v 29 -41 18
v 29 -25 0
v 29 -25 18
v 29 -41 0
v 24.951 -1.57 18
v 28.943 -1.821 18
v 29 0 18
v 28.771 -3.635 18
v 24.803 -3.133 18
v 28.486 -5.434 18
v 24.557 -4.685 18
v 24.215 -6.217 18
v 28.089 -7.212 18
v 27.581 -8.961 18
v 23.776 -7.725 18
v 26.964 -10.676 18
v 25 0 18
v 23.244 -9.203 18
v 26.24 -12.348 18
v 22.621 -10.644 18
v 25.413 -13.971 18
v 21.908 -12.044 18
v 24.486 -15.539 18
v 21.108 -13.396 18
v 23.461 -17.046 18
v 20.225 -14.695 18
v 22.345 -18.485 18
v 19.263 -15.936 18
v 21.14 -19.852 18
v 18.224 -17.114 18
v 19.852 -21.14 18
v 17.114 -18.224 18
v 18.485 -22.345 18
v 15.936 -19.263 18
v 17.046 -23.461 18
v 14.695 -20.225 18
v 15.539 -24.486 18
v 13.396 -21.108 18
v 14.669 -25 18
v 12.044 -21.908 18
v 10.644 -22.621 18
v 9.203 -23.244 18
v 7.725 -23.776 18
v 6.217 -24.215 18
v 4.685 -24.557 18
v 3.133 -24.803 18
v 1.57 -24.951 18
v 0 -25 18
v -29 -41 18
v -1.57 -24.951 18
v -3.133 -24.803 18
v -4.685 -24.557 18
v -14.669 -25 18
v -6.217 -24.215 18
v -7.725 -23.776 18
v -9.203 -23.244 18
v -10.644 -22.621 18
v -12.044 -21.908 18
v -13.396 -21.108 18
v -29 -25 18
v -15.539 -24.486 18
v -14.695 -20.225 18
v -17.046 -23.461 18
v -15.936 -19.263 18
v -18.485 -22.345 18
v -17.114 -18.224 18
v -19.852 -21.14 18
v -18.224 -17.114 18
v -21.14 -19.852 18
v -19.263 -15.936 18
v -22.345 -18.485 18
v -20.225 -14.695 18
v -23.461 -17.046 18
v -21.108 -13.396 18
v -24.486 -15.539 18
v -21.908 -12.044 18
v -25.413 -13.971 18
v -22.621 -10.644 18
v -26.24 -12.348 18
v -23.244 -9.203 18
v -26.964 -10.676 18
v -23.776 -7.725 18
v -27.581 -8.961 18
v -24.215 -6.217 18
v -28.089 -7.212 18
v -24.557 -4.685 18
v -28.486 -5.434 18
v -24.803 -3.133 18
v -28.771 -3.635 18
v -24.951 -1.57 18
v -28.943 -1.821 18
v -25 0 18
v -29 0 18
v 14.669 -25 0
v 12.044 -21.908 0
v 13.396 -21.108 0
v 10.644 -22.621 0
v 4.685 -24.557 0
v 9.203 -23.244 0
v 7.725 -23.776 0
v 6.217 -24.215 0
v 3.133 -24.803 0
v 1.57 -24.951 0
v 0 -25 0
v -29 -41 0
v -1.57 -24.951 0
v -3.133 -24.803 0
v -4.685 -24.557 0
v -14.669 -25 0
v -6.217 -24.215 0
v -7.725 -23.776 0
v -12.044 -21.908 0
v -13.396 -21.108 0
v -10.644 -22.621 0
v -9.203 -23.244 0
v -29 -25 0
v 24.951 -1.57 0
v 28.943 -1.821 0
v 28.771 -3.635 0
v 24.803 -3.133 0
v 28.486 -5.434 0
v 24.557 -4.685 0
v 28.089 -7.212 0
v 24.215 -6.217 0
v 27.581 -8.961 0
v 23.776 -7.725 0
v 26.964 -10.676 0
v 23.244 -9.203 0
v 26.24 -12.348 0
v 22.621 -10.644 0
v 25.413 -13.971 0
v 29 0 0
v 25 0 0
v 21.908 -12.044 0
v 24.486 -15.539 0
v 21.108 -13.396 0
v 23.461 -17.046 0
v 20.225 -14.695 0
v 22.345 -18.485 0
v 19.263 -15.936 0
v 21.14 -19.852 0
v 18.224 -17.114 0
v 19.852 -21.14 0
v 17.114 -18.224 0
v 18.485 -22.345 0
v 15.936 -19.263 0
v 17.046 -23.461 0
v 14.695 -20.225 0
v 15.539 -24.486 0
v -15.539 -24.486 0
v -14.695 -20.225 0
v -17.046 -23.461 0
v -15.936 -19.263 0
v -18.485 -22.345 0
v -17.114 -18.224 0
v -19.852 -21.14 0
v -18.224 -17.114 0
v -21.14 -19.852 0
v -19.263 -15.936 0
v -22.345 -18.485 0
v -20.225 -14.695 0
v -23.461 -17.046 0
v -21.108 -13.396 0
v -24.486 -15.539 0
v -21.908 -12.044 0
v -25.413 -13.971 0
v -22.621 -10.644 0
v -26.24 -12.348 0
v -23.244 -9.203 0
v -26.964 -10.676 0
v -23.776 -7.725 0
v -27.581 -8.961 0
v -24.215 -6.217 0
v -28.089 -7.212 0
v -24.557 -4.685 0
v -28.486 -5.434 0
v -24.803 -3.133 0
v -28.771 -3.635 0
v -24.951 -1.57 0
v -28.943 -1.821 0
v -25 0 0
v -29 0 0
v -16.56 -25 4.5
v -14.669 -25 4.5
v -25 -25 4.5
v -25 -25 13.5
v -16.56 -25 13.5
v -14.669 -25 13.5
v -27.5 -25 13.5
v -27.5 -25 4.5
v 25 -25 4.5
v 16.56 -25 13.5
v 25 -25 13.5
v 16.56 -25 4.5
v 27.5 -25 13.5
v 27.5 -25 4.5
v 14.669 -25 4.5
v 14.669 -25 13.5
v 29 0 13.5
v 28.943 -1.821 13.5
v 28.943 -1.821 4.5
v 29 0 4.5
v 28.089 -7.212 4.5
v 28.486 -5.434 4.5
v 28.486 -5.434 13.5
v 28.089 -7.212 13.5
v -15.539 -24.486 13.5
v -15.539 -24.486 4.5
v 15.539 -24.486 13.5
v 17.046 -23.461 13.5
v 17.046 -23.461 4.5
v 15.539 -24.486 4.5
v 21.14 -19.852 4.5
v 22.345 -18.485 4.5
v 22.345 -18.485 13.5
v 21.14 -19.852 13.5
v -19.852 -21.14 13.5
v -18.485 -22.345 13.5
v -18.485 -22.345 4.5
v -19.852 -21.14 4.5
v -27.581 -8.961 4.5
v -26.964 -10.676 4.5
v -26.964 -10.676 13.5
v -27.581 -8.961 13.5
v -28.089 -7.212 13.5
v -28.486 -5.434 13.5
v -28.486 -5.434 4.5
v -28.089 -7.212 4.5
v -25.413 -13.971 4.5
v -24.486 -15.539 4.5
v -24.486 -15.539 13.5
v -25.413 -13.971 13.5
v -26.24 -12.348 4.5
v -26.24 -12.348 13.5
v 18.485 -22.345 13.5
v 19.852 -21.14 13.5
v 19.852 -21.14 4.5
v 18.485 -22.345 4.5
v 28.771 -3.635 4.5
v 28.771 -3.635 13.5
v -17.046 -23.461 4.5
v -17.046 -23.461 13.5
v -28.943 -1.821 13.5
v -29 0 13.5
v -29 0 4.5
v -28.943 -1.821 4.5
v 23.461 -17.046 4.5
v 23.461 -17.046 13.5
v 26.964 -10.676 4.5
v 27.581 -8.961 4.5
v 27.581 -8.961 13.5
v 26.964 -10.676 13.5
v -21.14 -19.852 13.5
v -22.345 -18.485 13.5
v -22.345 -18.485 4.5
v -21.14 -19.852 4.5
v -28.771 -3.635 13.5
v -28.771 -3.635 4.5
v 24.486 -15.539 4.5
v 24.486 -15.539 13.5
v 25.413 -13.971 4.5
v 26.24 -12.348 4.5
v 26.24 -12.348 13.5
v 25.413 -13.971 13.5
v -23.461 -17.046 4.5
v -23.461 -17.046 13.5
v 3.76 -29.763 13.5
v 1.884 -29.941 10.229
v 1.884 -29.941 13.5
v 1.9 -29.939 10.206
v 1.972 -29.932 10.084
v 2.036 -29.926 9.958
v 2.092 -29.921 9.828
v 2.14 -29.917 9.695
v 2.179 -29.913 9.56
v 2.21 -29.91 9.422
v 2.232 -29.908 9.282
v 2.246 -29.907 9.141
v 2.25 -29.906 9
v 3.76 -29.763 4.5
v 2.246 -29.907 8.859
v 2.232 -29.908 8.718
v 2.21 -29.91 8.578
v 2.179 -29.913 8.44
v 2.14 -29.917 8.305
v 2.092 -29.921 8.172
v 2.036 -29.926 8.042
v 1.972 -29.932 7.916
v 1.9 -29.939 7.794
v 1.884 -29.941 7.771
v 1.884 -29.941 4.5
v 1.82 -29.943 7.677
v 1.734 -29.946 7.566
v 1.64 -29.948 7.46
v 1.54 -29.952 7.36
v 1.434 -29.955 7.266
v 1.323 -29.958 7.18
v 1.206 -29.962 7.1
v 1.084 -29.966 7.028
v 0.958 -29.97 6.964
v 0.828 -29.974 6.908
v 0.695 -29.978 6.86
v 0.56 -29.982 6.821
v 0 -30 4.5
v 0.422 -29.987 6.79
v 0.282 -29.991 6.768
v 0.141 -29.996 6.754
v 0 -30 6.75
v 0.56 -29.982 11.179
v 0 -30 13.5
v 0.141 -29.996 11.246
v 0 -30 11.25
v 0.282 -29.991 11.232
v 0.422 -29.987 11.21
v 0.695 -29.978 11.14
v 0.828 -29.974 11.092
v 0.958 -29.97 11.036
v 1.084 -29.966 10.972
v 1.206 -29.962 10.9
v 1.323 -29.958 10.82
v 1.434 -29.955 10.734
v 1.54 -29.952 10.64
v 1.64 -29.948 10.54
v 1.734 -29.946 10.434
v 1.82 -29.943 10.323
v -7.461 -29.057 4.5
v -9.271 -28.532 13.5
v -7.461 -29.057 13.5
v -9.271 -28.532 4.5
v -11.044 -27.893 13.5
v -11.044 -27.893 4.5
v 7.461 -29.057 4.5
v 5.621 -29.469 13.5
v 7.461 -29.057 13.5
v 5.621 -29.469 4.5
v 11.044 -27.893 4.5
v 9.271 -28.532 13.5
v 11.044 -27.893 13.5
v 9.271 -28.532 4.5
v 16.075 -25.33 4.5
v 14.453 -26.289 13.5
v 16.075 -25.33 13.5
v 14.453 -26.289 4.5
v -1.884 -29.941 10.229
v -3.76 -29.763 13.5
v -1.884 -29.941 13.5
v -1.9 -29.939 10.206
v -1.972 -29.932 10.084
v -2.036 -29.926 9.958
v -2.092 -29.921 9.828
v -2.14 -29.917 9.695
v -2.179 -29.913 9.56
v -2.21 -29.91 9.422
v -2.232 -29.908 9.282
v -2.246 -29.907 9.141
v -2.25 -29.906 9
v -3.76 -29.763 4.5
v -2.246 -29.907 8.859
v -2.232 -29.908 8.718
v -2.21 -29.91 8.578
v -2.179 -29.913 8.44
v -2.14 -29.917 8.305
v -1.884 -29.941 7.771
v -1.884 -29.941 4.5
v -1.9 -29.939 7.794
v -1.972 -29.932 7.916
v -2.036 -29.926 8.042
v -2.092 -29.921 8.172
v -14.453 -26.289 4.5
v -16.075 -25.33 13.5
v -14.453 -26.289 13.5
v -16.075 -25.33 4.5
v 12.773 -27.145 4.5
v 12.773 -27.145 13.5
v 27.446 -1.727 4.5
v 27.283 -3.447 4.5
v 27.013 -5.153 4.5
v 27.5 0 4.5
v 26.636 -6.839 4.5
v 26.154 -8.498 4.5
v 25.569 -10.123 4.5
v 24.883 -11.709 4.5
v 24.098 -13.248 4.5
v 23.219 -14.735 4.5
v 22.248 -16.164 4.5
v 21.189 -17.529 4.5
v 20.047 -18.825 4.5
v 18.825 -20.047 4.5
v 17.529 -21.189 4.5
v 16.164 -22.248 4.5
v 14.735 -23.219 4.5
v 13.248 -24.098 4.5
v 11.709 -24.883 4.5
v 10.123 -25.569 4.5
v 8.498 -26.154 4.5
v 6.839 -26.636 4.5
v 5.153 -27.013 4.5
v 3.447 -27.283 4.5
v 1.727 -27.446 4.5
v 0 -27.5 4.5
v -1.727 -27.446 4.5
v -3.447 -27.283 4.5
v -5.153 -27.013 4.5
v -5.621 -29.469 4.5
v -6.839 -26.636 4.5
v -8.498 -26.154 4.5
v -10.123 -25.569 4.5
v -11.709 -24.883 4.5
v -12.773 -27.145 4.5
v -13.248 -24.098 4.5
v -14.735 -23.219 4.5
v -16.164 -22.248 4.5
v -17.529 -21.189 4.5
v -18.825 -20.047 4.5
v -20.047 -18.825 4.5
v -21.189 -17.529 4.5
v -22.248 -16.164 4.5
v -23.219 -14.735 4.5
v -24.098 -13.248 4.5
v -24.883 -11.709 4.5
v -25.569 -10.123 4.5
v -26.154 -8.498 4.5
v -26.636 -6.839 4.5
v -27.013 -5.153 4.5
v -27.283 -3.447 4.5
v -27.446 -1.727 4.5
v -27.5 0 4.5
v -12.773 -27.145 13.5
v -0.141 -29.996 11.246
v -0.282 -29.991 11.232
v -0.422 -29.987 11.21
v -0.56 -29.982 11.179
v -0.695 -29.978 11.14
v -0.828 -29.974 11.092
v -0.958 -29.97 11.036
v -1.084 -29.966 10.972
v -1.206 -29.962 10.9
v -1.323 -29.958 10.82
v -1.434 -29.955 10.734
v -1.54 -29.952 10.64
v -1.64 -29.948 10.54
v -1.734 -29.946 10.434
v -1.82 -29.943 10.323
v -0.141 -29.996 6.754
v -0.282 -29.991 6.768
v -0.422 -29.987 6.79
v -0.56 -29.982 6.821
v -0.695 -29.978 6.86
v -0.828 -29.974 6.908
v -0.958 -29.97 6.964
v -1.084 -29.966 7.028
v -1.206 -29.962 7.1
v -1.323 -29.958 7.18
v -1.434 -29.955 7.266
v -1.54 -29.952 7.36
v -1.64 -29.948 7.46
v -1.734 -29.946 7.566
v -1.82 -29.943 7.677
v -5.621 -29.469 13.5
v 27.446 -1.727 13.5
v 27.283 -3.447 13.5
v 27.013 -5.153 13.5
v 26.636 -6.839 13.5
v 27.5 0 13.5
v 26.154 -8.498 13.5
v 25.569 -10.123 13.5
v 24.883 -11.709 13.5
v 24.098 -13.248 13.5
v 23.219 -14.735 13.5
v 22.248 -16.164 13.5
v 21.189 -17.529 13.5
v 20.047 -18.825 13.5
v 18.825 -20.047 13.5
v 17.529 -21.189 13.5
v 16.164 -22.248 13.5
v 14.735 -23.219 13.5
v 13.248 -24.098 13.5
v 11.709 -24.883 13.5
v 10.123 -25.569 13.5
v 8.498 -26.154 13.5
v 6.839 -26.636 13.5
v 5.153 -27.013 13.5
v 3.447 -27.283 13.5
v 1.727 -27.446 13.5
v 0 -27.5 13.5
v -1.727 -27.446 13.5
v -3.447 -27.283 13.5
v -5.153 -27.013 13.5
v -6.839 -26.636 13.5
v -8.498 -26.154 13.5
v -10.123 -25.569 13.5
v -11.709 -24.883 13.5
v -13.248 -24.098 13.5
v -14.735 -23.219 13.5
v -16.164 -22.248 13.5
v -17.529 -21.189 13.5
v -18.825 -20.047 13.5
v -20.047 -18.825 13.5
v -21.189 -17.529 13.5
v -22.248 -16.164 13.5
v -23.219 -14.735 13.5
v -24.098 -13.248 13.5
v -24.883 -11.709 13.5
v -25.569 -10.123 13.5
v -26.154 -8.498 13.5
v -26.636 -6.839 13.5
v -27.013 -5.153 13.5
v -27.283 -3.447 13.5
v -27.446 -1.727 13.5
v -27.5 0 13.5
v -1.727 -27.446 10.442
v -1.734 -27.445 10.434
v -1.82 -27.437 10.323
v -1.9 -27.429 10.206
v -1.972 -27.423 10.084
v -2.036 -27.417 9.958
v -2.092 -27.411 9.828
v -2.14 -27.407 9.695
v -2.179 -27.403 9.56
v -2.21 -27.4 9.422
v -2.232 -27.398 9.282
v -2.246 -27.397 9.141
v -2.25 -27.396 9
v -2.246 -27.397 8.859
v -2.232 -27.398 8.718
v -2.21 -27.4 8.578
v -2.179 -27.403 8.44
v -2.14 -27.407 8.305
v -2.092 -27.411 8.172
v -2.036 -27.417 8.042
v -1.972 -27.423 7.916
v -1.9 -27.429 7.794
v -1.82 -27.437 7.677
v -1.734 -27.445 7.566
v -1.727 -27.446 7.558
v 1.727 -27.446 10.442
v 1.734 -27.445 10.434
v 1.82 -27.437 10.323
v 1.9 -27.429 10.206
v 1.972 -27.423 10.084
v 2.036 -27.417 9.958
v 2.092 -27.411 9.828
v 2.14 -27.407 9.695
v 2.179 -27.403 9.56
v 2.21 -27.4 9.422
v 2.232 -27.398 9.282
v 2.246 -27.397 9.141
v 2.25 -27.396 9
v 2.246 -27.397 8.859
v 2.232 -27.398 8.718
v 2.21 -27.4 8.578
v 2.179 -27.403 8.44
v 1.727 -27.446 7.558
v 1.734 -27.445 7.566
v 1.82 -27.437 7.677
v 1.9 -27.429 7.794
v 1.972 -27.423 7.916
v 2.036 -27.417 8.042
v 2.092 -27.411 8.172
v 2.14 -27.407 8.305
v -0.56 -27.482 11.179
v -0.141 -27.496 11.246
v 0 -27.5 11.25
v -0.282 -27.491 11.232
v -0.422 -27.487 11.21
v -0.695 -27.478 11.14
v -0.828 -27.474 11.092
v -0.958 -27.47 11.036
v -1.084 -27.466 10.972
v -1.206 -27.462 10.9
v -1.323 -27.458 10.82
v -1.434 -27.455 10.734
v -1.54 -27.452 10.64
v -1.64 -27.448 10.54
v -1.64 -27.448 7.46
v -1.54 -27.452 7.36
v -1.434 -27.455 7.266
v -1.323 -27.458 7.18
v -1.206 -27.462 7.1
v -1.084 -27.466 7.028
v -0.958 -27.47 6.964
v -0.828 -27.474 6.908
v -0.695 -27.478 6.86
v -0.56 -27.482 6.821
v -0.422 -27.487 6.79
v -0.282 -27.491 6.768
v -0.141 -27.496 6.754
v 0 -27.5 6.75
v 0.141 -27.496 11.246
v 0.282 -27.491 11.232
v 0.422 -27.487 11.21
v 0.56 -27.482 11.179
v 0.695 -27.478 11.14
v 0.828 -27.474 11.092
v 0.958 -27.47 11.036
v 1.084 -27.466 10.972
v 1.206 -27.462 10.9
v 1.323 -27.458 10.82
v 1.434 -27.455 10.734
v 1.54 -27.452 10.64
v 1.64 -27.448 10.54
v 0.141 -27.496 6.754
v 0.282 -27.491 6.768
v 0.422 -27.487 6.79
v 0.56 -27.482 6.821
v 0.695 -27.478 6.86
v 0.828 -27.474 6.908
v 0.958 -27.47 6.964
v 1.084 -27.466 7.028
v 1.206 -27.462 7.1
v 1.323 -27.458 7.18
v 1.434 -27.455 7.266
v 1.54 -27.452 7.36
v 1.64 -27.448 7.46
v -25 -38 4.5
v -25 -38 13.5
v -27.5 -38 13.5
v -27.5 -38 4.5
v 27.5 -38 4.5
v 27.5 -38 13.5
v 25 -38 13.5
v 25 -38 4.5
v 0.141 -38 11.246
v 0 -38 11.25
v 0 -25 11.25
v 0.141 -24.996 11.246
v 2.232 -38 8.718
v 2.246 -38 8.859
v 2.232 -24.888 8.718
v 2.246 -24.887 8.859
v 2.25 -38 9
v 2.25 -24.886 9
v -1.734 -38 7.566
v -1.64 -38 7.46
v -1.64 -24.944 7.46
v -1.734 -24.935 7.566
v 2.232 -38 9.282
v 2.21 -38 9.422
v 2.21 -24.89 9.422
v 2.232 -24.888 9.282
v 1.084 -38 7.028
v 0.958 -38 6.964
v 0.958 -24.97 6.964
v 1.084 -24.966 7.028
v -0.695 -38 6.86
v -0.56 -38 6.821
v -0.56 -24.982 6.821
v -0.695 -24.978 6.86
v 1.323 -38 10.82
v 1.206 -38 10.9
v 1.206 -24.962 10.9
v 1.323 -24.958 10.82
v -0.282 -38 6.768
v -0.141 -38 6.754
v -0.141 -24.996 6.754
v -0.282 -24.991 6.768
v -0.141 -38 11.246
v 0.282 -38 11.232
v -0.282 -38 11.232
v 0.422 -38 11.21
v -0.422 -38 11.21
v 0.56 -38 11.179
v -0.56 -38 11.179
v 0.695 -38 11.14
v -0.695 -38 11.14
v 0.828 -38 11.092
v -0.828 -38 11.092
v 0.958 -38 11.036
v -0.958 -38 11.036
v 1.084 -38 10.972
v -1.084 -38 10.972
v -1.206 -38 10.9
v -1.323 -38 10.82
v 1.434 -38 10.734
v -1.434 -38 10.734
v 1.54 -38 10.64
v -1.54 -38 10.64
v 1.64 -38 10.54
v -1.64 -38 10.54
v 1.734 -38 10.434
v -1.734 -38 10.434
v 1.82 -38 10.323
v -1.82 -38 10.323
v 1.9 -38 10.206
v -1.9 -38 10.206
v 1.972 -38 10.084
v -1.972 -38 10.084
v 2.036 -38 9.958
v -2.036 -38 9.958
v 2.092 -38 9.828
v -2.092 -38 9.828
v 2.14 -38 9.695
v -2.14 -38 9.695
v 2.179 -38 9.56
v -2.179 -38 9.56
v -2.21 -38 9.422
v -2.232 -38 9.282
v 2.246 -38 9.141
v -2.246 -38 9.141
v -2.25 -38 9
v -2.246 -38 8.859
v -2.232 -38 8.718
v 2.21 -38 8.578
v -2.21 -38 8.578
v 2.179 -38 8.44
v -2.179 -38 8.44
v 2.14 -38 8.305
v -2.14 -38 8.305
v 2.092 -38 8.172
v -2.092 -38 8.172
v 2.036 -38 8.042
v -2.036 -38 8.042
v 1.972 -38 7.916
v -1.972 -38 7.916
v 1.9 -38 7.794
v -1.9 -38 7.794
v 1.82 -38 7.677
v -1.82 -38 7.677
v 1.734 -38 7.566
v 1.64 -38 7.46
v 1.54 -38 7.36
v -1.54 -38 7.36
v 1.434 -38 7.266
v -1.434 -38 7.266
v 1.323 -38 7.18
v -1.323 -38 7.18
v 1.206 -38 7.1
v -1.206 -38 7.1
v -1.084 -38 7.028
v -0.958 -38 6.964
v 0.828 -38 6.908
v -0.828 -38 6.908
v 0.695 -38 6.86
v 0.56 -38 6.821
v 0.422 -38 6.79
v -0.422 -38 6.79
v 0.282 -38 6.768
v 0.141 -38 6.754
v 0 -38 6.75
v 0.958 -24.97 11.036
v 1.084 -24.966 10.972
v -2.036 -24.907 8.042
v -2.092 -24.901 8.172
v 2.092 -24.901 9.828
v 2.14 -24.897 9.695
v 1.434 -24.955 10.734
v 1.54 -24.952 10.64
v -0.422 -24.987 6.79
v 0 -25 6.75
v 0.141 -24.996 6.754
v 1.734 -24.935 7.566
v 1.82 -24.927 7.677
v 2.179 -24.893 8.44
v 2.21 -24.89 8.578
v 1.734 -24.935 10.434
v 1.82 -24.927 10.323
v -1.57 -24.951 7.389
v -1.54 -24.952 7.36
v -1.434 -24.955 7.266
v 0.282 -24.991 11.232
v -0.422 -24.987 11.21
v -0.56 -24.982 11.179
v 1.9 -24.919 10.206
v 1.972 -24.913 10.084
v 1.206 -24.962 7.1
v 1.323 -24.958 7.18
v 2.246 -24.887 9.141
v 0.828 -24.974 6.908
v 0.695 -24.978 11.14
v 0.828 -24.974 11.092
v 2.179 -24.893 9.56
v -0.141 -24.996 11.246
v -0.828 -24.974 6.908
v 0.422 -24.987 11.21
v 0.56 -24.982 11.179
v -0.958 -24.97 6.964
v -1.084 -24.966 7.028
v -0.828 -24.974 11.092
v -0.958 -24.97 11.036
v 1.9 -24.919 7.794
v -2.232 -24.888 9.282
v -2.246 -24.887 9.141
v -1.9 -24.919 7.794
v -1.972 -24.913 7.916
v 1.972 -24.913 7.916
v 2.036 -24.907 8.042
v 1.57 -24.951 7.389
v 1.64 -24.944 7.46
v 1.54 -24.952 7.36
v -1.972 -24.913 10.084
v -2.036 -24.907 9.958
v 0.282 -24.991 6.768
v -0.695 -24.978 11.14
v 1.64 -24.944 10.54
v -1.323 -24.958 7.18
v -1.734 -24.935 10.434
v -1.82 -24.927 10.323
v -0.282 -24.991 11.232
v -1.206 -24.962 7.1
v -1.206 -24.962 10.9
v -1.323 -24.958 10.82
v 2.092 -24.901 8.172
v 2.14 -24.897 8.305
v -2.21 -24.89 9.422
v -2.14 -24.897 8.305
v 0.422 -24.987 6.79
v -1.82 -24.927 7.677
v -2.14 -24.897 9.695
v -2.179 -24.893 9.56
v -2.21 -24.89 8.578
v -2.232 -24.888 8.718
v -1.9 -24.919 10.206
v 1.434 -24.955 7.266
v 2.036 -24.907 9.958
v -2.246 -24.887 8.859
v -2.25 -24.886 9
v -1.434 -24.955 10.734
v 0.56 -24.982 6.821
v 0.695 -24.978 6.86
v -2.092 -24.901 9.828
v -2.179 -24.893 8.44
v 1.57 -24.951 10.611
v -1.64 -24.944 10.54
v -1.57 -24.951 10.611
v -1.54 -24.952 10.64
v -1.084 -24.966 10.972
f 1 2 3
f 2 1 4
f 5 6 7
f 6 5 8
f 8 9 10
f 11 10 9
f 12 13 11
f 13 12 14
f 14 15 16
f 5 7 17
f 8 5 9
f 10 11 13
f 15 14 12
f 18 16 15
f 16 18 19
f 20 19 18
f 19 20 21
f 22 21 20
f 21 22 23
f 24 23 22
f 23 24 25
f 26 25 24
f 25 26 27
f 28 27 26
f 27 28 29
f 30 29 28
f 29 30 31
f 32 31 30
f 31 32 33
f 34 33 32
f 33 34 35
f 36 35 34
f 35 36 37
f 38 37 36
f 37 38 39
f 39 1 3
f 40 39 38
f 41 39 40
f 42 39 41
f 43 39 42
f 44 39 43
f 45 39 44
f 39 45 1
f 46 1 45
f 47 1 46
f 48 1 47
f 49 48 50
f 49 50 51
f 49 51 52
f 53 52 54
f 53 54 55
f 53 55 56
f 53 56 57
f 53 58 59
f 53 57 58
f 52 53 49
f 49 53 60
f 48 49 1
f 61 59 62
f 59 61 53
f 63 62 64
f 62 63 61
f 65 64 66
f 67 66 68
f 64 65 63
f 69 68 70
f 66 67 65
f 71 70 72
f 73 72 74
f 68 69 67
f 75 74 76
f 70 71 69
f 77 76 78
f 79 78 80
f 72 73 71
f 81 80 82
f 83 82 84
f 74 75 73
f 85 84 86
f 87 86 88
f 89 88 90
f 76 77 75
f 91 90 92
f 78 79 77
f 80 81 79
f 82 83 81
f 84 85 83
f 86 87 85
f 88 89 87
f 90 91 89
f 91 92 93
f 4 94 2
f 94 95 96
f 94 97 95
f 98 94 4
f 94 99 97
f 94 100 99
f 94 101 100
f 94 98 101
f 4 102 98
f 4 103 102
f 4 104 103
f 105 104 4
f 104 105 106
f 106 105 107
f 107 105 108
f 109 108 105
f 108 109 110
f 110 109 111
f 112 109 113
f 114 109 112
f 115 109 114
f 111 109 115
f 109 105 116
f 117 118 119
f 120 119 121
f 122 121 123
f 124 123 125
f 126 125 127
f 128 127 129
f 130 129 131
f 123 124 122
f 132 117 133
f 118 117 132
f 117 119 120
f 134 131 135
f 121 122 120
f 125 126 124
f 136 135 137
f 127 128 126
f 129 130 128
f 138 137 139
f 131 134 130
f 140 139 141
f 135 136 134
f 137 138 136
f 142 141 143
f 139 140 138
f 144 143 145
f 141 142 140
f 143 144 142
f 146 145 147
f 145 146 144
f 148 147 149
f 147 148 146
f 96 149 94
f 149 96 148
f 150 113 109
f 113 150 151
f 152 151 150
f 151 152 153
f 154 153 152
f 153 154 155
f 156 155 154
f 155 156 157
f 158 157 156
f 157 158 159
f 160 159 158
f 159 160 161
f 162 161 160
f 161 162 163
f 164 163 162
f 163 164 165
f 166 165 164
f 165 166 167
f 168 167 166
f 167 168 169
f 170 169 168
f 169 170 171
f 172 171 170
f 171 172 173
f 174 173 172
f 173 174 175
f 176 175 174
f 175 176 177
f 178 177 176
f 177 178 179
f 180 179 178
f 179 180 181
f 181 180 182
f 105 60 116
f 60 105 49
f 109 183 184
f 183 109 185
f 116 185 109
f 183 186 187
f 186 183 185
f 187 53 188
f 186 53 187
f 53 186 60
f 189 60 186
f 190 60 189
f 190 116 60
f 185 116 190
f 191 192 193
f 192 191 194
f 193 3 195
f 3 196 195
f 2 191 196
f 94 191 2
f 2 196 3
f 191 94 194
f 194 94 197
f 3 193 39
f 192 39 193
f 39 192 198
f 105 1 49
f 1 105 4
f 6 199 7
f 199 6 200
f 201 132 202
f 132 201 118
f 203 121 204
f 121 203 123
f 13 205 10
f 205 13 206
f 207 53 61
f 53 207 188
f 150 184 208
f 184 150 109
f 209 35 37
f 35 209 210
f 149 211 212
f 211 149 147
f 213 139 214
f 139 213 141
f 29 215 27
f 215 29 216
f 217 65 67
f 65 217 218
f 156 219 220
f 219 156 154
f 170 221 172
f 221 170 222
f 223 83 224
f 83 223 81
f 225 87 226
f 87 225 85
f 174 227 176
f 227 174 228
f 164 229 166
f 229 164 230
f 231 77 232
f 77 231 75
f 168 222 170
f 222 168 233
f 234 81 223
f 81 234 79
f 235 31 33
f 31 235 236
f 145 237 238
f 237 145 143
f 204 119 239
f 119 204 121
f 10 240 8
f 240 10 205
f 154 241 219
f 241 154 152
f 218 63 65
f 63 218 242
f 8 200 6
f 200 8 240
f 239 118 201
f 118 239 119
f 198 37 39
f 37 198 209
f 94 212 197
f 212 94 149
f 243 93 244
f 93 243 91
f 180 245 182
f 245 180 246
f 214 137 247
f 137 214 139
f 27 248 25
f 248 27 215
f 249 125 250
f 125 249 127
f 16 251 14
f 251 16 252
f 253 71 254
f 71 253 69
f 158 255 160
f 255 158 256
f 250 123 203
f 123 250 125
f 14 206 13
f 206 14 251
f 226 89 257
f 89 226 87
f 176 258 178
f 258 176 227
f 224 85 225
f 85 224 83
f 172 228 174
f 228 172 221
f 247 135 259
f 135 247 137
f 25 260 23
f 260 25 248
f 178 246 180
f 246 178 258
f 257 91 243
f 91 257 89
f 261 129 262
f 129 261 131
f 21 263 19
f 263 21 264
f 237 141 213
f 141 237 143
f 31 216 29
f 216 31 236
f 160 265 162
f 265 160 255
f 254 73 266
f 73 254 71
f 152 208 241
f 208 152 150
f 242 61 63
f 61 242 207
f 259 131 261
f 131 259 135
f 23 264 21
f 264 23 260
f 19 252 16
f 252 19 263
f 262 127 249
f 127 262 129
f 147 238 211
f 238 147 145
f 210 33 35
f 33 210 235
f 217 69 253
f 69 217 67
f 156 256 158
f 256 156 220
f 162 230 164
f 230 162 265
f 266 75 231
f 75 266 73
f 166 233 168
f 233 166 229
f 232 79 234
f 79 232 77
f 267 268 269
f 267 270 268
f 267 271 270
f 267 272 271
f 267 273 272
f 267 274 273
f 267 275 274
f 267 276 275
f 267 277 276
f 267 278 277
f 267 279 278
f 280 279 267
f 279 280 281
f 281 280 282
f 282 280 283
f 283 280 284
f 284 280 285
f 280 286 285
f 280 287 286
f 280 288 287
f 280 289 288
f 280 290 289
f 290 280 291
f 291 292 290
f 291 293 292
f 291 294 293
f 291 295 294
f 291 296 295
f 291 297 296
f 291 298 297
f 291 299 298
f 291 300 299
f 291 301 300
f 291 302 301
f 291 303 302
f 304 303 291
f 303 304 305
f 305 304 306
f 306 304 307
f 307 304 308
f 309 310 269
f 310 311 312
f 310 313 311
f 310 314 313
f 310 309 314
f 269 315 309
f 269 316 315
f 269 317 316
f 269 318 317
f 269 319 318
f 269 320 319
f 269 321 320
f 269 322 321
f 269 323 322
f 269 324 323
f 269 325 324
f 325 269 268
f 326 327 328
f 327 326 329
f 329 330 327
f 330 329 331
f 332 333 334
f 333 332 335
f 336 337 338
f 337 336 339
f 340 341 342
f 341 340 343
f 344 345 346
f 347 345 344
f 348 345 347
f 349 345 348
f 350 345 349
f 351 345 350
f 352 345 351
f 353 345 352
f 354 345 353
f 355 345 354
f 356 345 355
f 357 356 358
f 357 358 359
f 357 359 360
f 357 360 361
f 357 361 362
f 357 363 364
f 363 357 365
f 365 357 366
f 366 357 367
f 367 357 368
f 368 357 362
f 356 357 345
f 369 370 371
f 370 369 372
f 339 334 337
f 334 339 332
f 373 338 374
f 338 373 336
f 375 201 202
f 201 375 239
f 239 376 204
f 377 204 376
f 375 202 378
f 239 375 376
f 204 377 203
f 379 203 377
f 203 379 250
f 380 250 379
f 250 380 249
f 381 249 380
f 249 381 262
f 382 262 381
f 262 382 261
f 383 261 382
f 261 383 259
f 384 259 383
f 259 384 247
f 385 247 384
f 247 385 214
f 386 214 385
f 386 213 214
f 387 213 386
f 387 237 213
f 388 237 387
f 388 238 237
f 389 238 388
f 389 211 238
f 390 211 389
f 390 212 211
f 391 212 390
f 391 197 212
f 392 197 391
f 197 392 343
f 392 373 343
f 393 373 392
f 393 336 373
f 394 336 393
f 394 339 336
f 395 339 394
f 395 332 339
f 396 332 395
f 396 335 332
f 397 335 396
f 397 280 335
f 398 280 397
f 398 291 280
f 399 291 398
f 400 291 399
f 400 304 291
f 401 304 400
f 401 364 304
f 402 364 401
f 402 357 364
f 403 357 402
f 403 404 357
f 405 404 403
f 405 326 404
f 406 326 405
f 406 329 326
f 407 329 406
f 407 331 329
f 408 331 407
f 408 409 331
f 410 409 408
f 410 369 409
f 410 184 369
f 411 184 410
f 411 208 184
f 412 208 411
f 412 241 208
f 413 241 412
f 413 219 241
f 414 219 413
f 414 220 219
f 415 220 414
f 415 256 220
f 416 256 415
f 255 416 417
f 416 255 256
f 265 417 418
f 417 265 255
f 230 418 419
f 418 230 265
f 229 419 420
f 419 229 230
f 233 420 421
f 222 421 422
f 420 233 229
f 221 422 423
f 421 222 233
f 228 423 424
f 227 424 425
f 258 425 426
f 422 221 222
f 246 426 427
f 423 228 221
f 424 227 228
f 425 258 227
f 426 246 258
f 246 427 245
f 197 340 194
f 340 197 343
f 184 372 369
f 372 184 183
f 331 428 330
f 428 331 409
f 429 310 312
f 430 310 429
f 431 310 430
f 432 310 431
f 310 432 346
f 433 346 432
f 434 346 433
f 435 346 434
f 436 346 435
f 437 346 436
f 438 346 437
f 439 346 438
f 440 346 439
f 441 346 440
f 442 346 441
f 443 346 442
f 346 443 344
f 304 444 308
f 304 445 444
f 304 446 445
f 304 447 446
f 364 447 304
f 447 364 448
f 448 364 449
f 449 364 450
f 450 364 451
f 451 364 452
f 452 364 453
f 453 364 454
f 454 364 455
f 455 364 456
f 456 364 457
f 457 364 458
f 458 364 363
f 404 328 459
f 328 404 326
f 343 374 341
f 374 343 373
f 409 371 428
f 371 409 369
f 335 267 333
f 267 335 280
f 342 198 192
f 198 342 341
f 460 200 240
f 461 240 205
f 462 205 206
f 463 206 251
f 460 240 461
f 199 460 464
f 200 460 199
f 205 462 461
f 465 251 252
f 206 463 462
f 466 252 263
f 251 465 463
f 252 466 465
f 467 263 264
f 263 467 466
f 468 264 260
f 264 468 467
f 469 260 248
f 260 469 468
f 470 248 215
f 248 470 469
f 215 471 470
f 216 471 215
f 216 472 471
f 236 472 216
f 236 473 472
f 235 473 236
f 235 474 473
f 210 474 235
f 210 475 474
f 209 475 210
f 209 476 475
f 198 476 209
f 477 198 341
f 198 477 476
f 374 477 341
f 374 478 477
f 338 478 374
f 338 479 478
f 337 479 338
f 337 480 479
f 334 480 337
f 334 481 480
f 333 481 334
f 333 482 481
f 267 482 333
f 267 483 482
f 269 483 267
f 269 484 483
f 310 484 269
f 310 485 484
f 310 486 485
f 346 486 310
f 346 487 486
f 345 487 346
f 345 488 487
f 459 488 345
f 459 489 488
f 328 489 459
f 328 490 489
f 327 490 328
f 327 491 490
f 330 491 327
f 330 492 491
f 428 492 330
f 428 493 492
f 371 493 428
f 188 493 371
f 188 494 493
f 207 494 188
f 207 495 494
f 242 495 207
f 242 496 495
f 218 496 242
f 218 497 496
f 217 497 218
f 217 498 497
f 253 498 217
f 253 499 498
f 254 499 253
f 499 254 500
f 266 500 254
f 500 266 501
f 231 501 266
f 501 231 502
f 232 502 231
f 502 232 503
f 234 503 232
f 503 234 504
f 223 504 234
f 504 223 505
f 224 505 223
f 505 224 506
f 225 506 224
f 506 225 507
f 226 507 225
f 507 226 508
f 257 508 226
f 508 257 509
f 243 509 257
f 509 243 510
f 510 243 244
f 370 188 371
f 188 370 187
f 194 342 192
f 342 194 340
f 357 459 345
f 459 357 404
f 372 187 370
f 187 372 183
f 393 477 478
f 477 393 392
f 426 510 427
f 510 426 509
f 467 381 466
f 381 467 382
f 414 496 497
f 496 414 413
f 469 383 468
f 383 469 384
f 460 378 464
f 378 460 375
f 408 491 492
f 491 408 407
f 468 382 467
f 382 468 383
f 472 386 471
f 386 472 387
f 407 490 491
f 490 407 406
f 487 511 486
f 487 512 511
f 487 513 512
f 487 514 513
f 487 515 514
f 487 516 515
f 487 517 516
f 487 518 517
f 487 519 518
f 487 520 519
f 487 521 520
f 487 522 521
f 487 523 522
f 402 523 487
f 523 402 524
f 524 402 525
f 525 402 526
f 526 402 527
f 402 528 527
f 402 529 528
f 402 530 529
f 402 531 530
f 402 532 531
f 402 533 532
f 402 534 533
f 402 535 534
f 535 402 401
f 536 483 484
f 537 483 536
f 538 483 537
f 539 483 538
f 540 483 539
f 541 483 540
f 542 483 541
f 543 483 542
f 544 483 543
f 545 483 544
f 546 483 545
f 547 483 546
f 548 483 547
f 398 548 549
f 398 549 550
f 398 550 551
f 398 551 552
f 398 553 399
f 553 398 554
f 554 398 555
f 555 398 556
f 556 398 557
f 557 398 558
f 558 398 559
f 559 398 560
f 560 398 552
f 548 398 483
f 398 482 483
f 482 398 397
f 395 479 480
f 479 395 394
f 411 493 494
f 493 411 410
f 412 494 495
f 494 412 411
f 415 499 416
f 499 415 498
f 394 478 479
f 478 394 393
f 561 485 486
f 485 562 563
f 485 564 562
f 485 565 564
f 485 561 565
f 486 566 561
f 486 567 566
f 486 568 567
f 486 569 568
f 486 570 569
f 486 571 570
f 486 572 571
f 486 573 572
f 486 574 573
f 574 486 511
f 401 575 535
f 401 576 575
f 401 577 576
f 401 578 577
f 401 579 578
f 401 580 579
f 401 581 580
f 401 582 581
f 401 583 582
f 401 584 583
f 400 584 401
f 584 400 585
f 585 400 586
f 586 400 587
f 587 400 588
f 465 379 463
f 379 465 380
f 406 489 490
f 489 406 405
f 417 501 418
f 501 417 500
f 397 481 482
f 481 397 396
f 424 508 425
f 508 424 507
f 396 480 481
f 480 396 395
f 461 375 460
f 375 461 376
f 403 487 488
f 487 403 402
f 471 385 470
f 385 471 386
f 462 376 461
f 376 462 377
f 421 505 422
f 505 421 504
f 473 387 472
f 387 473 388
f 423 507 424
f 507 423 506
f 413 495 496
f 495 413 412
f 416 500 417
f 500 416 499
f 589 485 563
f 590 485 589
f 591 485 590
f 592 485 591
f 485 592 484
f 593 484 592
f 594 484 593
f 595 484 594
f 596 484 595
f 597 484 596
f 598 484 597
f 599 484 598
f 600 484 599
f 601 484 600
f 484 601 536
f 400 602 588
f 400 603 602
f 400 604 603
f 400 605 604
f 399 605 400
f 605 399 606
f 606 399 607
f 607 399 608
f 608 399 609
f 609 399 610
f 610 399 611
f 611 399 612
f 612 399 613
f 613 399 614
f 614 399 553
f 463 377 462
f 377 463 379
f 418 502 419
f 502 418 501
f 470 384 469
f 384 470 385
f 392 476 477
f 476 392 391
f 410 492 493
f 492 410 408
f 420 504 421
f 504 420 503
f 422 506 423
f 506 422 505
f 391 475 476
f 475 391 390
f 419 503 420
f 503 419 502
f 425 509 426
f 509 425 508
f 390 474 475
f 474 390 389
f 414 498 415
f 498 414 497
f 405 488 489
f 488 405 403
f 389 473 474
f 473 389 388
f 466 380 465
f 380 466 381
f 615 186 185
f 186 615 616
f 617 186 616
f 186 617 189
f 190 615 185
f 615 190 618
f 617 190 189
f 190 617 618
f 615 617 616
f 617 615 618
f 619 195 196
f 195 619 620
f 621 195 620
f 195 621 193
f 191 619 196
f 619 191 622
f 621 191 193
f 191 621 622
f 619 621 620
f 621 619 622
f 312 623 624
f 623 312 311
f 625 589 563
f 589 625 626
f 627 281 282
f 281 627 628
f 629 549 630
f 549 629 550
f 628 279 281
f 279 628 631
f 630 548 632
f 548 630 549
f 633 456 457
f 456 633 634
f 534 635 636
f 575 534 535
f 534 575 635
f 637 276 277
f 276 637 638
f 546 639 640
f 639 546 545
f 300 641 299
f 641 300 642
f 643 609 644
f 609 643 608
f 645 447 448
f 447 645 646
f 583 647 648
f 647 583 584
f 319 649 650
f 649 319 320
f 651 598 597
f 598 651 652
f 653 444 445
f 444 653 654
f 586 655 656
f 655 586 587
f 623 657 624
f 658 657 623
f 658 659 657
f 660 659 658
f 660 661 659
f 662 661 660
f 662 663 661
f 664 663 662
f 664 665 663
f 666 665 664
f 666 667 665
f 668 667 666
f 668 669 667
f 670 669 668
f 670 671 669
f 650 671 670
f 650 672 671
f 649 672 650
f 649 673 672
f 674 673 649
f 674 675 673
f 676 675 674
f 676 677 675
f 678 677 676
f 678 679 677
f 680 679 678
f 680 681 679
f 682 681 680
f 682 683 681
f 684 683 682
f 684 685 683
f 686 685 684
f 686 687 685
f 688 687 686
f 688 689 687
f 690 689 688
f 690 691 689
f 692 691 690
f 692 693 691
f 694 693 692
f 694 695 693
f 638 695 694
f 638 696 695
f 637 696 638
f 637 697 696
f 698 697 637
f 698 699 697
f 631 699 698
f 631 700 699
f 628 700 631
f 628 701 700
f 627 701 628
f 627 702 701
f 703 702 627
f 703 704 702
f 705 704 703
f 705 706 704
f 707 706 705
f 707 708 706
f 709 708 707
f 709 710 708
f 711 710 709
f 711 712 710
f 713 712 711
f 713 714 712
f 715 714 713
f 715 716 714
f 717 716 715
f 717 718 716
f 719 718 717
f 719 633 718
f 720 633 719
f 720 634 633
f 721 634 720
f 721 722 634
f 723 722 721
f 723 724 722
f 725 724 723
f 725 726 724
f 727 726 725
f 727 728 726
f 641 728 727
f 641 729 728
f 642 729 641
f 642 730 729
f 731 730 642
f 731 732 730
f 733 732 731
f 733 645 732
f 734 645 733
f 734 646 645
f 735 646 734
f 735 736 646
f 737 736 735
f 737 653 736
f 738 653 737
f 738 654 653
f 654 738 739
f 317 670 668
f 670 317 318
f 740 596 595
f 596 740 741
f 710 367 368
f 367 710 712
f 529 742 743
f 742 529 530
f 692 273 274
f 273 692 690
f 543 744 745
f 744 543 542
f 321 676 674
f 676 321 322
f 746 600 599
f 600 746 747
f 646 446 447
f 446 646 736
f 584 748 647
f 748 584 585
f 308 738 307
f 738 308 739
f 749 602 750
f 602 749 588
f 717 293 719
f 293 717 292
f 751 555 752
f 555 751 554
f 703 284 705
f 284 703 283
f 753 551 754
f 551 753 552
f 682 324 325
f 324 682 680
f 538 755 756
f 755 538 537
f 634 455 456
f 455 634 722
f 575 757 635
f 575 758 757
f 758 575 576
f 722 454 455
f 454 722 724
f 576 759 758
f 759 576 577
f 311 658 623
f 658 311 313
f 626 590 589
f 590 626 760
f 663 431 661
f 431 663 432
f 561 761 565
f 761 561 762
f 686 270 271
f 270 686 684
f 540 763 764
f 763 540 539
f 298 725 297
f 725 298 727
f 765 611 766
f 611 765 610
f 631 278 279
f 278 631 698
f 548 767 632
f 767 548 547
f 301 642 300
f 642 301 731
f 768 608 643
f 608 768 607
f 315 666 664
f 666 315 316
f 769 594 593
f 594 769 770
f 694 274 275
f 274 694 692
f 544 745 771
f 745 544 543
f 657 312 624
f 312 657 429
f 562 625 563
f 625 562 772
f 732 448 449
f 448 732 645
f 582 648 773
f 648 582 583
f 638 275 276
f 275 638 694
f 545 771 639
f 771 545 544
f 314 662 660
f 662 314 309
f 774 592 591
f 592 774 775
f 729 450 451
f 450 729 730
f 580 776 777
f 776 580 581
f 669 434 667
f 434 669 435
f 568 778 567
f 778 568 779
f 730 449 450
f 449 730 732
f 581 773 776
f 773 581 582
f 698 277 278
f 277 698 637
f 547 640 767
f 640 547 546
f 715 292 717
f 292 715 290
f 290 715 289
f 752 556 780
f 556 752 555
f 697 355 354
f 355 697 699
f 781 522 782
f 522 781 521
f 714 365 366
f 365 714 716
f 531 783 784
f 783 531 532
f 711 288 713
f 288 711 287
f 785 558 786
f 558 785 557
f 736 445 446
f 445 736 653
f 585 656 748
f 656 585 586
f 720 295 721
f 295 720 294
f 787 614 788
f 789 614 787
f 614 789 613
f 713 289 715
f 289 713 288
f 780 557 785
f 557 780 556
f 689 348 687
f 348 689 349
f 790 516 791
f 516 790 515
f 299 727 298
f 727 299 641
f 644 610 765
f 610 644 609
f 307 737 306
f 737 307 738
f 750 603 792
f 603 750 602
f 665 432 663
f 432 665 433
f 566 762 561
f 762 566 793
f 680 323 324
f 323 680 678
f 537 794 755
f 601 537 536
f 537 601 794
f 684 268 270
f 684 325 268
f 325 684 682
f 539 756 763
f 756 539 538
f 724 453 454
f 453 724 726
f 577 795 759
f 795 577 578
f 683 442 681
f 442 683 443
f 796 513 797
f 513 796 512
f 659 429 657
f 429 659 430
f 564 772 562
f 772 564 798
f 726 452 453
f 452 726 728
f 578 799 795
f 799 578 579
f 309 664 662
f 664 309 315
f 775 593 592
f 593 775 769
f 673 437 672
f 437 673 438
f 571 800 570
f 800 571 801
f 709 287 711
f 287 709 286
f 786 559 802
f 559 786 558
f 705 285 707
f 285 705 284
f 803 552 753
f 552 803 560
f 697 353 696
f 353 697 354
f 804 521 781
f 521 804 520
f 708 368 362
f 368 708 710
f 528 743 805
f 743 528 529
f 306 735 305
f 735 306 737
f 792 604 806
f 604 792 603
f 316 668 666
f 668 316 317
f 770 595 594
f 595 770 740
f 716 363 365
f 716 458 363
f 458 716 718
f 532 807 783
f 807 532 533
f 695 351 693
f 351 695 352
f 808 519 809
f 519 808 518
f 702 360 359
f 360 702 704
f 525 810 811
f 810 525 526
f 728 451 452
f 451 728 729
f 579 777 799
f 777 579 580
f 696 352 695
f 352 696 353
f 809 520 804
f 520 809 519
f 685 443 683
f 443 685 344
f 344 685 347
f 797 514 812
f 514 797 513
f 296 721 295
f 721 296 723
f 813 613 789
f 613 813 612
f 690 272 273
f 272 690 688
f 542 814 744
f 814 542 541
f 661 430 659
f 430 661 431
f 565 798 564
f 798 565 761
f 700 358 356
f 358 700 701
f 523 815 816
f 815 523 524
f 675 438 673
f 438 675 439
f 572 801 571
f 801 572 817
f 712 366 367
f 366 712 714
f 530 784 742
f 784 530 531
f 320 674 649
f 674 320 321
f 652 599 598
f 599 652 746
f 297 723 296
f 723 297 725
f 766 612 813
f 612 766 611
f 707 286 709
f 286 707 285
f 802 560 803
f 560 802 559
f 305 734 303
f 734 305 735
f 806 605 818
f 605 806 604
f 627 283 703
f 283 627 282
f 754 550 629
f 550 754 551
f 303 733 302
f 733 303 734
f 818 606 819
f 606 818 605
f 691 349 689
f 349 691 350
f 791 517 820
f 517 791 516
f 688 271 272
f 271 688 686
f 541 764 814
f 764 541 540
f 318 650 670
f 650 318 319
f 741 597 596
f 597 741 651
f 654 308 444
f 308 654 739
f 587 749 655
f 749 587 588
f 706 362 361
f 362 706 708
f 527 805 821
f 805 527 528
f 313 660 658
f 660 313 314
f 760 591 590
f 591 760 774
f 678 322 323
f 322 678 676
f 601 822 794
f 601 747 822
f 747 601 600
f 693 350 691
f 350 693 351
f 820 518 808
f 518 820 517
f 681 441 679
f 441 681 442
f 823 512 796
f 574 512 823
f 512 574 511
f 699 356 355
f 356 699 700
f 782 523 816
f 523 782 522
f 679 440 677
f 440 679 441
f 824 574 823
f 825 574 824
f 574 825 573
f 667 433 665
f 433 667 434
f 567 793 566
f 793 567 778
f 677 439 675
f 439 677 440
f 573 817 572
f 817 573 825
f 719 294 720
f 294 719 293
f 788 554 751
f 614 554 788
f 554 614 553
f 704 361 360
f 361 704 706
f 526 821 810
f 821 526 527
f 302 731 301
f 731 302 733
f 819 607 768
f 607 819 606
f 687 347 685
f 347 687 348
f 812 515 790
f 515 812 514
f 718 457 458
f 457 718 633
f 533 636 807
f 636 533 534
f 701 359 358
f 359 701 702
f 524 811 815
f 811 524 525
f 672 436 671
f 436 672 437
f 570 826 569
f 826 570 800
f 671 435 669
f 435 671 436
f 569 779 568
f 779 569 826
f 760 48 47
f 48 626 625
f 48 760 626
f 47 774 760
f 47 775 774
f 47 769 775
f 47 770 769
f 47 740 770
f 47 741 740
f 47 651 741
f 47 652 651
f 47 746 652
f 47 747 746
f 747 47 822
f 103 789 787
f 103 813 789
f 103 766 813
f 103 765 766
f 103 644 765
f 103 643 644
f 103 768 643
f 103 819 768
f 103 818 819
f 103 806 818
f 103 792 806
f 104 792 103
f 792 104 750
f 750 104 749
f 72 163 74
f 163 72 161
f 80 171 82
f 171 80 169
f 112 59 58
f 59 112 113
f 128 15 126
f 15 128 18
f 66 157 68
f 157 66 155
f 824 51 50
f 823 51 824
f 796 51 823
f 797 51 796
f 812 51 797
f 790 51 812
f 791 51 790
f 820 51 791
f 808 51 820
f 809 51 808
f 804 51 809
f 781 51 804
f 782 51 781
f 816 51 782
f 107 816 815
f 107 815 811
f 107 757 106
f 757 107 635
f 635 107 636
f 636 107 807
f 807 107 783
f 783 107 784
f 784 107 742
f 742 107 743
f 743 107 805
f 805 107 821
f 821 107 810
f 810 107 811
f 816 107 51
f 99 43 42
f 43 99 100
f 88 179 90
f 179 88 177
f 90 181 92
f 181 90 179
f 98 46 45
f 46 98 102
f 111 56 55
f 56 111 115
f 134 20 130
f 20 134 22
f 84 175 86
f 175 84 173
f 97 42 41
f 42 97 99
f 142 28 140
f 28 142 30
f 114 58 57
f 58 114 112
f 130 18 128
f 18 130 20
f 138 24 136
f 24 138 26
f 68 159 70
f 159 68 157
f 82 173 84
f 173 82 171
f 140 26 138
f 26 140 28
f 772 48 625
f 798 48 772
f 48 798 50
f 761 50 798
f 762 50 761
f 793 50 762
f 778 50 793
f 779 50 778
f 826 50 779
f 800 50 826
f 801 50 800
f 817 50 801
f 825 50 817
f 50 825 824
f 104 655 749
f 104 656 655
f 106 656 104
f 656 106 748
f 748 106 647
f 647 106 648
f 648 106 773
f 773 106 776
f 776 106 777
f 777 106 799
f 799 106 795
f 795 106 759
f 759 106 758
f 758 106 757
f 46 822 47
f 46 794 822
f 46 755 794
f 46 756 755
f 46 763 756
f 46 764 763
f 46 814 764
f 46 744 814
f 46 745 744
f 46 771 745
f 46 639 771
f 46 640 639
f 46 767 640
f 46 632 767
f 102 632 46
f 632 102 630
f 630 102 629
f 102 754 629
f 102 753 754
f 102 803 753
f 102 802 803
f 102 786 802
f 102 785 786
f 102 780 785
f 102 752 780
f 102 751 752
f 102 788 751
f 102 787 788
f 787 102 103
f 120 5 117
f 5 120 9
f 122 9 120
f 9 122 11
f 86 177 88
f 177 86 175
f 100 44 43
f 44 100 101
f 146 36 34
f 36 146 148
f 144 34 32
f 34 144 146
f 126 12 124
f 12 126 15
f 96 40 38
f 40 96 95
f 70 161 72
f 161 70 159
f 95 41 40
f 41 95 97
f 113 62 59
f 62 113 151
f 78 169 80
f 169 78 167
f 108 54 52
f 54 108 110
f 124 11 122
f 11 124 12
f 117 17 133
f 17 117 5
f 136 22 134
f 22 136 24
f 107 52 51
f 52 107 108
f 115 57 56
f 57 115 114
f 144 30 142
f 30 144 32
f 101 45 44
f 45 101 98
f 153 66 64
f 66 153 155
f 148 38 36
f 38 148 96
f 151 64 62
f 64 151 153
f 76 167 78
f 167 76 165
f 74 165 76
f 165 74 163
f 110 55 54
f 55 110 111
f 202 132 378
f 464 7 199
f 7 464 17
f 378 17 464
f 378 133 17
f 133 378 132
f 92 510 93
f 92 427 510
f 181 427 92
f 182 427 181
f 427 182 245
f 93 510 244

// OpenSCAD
// --- PARAMÈTRES RÉGLABLES ---
$fn = 100;                  // Résolution des cylindres

// Dimensions du tuyau
d_tuyau = 50;               // Diamètre extérieur du tuyau (mm)
epaisseur_bride = 4;        // Épaisseur du plastique autour du tuyau (mm)
largeur_bride = 18;         // Largeur de la bride (mm) - Augmentée pour la solidité

// Dimensions du passage de l'attache-câble (Colson / Serflex)
largeur_collier = 9;        // Largeur max du collier (mm)
epaisseur_collier = 2.5;    // Épaisseur max du collier (mm)

// Dimensions de l'embase de fixation (vis)
d_vis = 4.5;                // Diamètre du trou de vis (mm)
d_fraisage = 9;             // Diamètre de la tête de vis (mm)
profondeur_fraisage = 3;    // Profondeur du fraisage (mm)
hauteur_embase = 12;        // Augmentée pour loger les canaux du collier


// --- MODULES ---

// 1. Forme extérieure brute (Support mural élargi + anneau extérieur)
module forme_exterieure() {
    // Calcul de la largeur nécessaire pour l'embase pour intégrer les canaux du collier
    largeur_embase = d_tuyau + (epaisseur_bride * 2);
    
    union() {
        // Embase plate rectangulaire
        translate([-largeur_embase/2, -d_tuyau/2 - epaisseur_bride - hauteur_embase, 0])
            cube([largeur_embase, hauteur_embase + epaisseur_bride, largeur_bride]);
        
        // Corps cylindrique extérieur
        cylinder(d = d_tuyau + (epaisseur_bride * 2), h = largeur_bride);
    }
}

// 2. Volume intérieur du tuyau
module passage_tuyau() {
    translate([0, 0, -1])
        cylinder(d = d_tuyau, h = largeur_bride + 2);
}

// 3. Découpe pour insérer le tuyau par le haut
module ouverture_haute() {
    translate([-d_tuyau, 0, -1])
        cube([d_tuyau * 2, d_tuyau, largeur_bride + 2]);
}

// 4. Rainure extérieure guidant le collier autour du tuyau
module goulotte_exterieure_collier() {
    difference() {
        // Cylindre de la taille du collier
        translate([0, 0, (largeur_bride - largeur_collier) / 2])
            cylinder(d = d_tuyau + (epaisseur_bride * 2) + 2, h = largeur_collier);
        
        // On préserve l'épaisseur minimale de la bride
        translate([0, 0, -1])
            cylinder(d = d_tuyau + (epaisseur_collier * 2), h = largeur_bride + 2);
    }
}

// 5. NOUVEAU : Trous traversants dans l'embase pour bloquer et passer le collier
module canaux_passage_collier() {
    offset_x = (d_tuyau / 2) + (epaisseur_collier / 2);
    z_pos = (largeur_bride - largeur_collier) / 2;
    
    // Canal gauche
    translate([-offset_x - epaisseur_collier/2, -d_tuyau/2 - hauteur_embase - 1, z_pos])
        cube([epaisseur_collier, hauteur_embase + 2, largeur_collier]);
        
    // Canal droit
    translate([offset_x - epaisseur_collier/2, -d_tuyau/2 - hauteur_embase - 1, z_pos])
        cube([epaisseur_collier, hauteur_embase + 2, largeur_collier]);
}

// 6. Trou et fraisage pour la vis de fixation centrale
module trou_fixation() {
    translate([0, -d_tuyau/2 - hauteur_embase - 1, largeur_bride / 2])
        rotate([-90, 0, 0]) {
            // Passage du corps de la vis
            cylinder(d = d_vis, h = hauteur_embase + epaisseur_bride + 2);
            
            // Fraisage pour la tête de la vis
            h_fraisage_total = hauteur_embase + epaisseur_bride + 1;
            translate([0, 0, h_fraisage_total - profondeur_fraisage])
                cylinder(d1 = d_vis, d2 = d_fraisage, h = profondeur_fraisage + 0.1);
        }
}


// --- ASSEMBLAGE FINAL ---
module bride_complete() {
    difference() {
        forme_exterieure();
        
        passage_tuyau();
        ouverture_haute();
        goulotte_exterieure_collier();
        canaux_passage_collier(); // Ce module verrouille désormais le collier à la base
        trou_fixation();
    }
}

// Rendu de la pièce
bride_complete();
